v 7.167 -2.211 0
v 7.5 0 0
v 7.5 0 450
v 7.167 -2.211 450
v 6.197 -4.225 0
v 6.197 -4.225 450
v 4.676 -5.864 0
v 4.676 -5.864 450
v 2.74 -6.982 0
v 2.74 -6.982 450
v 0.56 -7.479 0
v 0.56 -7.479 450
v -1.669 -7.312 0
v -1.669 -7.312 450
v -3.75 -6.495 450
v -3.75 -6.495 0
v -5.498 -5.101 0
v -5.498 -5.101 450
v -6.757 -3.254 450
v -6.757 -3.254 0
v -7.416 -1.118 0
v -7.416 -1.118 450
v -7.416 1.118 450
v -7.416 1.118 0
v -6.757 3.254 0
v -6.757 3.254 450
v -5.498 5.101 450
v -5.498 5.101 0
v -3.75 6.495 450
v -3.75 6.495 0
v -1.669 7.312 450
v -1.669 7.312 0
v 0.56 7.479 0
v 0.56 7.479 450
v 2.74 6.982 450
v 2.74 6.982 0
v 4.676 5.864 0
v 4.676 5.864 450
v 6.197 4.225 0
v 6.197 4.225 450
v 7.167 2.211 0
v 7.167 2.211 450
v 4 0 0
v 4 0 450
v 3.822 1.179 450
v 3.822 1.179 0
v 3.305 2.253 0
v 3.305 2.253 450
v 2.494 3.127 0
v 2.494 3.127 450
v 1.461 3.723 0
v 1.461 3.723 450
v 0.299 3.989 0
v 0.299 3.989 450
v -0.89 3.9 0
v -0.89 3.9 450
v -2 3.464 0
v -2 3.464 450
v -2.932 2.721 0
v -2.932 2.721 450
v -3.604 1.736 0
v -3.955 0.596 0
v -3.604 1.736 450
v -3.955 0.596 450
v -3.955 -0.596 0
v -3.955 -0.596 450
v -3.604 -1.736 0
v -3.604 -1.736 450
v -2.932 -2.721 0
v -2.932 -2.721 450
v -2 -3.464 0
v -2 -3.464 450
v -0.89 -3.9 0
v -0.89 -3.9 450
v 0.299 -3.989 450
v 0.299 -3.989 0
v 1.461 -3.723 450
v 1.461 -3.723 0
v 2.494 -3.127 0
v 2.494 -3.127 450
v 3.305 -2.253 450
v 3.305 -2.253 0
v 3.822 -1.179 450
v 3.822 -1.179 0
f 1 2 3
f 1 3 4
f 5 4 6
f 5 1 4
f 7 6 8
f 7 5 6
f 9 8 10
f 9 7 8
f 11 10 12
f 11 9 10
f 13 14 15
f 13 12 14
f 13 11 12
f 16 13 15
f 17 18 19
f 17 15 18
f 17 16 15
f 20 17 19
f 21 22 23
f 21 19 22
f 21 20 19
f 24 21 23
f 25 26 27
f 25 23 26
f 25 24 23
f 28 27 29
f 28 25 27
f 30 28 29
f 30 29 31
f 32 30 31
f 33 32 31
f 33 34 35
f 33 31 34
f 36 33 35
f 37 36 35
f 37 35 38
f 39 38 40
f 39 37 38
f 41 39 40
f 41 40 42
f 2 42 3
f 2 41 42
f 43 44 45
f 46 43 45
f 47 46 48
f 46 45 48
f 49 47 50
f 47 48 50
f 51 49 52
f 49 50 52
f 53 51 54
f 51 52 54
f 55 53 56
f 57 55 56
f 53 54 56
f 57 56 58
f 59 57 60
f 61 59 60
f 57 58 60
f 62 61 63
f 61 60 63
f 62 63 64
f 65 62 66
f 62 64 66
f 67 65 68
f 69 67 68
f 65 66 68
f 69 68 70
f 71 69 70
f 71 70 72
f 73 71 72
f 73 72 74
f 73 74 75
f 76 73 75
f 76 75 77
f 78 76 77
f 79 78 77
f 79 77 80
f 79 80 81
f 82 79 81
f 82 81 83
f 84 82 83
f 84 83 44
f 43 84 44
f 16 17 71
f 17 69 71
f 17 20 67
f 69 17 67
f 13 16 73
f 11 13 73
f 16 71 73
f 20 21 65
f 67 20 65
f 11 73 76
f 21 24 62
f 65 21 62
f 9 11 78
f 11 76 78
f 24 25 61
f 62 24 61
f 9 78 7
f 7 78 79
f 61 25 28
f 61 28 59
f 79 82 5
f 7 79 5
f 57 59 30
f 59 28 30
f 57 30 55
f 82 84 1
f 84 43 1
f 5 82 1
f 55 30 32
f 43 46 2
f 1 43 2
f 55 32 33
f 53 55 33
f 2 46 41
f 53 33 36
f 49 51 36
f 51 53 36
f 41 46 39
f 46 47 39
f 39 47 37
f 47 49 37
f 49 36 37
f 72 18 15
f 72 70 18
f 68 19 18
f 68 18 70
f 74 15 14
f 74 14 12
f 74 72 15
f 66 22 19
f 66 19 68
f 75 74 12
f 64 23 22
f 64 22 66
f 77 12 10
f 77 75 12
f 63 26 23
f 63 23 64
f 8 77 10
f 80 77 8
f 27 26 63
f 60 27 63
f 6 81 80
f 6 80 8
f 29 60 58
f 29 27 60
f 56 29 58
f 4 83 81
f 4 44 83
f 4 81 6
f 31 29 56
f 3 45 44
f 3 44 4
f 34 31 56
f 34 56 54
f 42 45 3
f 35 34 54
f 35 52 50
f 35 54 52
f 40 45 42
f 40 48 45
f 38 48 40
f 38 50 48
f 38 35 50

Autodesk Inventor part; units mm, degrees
ref_plane "YZ Plane" through (0, 0, 0) normal (1, 0, 0) x (0, 1, 0)
ref_plane "XZ Plane" through (0, 0, 0) normal (0, 1, 0) x (-1, 0, 0)
ref_plane "XY Plane" through (0, 0, 0) normal (0, 0, 1) x (1, 0, 0)
sketch "Sketch1" plane through (0, 0, 0) normal (0, 0, 1) x (1, 0, 0)
  circle A0 centre (0, 0) radius 7.5
  dimension "d0" = 15
extrude "Extrusion1" add sketch "Sketch1" along normal blind 100
sketch "Sketch2" plane through (0, 0, 100) normal (0, 0, 1) x (1, 0, 0)
  circle A0 centre (0, 0) radius 4
  dimension "d3" = 8
extrude "Extrusion2" cut sketch "Sketch2" against normal blind 100
sketch "Sketch3" plane through (0, 0, 100) normal (0, 0, 1) x (1, 0, 0)
  circle A0 centre (0, 0) radius 7.5
extrude "Extrusion3" add sketch "Sketch3" along normal blind 400
sketch "Sketch4" plane through (0, 0, 500) normal (0, 0, 1) x (1, 0, 0)
  circle A0 centre (0, 0) radius 4
  dimension "d8" = 8
extrude "Extrusion4" cut sketch "Sketch4" against normal blind 400
sketch "Sketch5" plane through (0, 0, 500) normal (0, 0, 1) x (1, 0, 0)
  circle A0 centre (0, 0) radius 7.5
  dimension "d11" = 15
extrude "Extrusion5" cut sketch "Sketch5" against normal blind 50
thread "Thread1" size "M15x1.5" class "6g" standard "ANSI Metric M Profile" full length
properties part number "ball pickr"
